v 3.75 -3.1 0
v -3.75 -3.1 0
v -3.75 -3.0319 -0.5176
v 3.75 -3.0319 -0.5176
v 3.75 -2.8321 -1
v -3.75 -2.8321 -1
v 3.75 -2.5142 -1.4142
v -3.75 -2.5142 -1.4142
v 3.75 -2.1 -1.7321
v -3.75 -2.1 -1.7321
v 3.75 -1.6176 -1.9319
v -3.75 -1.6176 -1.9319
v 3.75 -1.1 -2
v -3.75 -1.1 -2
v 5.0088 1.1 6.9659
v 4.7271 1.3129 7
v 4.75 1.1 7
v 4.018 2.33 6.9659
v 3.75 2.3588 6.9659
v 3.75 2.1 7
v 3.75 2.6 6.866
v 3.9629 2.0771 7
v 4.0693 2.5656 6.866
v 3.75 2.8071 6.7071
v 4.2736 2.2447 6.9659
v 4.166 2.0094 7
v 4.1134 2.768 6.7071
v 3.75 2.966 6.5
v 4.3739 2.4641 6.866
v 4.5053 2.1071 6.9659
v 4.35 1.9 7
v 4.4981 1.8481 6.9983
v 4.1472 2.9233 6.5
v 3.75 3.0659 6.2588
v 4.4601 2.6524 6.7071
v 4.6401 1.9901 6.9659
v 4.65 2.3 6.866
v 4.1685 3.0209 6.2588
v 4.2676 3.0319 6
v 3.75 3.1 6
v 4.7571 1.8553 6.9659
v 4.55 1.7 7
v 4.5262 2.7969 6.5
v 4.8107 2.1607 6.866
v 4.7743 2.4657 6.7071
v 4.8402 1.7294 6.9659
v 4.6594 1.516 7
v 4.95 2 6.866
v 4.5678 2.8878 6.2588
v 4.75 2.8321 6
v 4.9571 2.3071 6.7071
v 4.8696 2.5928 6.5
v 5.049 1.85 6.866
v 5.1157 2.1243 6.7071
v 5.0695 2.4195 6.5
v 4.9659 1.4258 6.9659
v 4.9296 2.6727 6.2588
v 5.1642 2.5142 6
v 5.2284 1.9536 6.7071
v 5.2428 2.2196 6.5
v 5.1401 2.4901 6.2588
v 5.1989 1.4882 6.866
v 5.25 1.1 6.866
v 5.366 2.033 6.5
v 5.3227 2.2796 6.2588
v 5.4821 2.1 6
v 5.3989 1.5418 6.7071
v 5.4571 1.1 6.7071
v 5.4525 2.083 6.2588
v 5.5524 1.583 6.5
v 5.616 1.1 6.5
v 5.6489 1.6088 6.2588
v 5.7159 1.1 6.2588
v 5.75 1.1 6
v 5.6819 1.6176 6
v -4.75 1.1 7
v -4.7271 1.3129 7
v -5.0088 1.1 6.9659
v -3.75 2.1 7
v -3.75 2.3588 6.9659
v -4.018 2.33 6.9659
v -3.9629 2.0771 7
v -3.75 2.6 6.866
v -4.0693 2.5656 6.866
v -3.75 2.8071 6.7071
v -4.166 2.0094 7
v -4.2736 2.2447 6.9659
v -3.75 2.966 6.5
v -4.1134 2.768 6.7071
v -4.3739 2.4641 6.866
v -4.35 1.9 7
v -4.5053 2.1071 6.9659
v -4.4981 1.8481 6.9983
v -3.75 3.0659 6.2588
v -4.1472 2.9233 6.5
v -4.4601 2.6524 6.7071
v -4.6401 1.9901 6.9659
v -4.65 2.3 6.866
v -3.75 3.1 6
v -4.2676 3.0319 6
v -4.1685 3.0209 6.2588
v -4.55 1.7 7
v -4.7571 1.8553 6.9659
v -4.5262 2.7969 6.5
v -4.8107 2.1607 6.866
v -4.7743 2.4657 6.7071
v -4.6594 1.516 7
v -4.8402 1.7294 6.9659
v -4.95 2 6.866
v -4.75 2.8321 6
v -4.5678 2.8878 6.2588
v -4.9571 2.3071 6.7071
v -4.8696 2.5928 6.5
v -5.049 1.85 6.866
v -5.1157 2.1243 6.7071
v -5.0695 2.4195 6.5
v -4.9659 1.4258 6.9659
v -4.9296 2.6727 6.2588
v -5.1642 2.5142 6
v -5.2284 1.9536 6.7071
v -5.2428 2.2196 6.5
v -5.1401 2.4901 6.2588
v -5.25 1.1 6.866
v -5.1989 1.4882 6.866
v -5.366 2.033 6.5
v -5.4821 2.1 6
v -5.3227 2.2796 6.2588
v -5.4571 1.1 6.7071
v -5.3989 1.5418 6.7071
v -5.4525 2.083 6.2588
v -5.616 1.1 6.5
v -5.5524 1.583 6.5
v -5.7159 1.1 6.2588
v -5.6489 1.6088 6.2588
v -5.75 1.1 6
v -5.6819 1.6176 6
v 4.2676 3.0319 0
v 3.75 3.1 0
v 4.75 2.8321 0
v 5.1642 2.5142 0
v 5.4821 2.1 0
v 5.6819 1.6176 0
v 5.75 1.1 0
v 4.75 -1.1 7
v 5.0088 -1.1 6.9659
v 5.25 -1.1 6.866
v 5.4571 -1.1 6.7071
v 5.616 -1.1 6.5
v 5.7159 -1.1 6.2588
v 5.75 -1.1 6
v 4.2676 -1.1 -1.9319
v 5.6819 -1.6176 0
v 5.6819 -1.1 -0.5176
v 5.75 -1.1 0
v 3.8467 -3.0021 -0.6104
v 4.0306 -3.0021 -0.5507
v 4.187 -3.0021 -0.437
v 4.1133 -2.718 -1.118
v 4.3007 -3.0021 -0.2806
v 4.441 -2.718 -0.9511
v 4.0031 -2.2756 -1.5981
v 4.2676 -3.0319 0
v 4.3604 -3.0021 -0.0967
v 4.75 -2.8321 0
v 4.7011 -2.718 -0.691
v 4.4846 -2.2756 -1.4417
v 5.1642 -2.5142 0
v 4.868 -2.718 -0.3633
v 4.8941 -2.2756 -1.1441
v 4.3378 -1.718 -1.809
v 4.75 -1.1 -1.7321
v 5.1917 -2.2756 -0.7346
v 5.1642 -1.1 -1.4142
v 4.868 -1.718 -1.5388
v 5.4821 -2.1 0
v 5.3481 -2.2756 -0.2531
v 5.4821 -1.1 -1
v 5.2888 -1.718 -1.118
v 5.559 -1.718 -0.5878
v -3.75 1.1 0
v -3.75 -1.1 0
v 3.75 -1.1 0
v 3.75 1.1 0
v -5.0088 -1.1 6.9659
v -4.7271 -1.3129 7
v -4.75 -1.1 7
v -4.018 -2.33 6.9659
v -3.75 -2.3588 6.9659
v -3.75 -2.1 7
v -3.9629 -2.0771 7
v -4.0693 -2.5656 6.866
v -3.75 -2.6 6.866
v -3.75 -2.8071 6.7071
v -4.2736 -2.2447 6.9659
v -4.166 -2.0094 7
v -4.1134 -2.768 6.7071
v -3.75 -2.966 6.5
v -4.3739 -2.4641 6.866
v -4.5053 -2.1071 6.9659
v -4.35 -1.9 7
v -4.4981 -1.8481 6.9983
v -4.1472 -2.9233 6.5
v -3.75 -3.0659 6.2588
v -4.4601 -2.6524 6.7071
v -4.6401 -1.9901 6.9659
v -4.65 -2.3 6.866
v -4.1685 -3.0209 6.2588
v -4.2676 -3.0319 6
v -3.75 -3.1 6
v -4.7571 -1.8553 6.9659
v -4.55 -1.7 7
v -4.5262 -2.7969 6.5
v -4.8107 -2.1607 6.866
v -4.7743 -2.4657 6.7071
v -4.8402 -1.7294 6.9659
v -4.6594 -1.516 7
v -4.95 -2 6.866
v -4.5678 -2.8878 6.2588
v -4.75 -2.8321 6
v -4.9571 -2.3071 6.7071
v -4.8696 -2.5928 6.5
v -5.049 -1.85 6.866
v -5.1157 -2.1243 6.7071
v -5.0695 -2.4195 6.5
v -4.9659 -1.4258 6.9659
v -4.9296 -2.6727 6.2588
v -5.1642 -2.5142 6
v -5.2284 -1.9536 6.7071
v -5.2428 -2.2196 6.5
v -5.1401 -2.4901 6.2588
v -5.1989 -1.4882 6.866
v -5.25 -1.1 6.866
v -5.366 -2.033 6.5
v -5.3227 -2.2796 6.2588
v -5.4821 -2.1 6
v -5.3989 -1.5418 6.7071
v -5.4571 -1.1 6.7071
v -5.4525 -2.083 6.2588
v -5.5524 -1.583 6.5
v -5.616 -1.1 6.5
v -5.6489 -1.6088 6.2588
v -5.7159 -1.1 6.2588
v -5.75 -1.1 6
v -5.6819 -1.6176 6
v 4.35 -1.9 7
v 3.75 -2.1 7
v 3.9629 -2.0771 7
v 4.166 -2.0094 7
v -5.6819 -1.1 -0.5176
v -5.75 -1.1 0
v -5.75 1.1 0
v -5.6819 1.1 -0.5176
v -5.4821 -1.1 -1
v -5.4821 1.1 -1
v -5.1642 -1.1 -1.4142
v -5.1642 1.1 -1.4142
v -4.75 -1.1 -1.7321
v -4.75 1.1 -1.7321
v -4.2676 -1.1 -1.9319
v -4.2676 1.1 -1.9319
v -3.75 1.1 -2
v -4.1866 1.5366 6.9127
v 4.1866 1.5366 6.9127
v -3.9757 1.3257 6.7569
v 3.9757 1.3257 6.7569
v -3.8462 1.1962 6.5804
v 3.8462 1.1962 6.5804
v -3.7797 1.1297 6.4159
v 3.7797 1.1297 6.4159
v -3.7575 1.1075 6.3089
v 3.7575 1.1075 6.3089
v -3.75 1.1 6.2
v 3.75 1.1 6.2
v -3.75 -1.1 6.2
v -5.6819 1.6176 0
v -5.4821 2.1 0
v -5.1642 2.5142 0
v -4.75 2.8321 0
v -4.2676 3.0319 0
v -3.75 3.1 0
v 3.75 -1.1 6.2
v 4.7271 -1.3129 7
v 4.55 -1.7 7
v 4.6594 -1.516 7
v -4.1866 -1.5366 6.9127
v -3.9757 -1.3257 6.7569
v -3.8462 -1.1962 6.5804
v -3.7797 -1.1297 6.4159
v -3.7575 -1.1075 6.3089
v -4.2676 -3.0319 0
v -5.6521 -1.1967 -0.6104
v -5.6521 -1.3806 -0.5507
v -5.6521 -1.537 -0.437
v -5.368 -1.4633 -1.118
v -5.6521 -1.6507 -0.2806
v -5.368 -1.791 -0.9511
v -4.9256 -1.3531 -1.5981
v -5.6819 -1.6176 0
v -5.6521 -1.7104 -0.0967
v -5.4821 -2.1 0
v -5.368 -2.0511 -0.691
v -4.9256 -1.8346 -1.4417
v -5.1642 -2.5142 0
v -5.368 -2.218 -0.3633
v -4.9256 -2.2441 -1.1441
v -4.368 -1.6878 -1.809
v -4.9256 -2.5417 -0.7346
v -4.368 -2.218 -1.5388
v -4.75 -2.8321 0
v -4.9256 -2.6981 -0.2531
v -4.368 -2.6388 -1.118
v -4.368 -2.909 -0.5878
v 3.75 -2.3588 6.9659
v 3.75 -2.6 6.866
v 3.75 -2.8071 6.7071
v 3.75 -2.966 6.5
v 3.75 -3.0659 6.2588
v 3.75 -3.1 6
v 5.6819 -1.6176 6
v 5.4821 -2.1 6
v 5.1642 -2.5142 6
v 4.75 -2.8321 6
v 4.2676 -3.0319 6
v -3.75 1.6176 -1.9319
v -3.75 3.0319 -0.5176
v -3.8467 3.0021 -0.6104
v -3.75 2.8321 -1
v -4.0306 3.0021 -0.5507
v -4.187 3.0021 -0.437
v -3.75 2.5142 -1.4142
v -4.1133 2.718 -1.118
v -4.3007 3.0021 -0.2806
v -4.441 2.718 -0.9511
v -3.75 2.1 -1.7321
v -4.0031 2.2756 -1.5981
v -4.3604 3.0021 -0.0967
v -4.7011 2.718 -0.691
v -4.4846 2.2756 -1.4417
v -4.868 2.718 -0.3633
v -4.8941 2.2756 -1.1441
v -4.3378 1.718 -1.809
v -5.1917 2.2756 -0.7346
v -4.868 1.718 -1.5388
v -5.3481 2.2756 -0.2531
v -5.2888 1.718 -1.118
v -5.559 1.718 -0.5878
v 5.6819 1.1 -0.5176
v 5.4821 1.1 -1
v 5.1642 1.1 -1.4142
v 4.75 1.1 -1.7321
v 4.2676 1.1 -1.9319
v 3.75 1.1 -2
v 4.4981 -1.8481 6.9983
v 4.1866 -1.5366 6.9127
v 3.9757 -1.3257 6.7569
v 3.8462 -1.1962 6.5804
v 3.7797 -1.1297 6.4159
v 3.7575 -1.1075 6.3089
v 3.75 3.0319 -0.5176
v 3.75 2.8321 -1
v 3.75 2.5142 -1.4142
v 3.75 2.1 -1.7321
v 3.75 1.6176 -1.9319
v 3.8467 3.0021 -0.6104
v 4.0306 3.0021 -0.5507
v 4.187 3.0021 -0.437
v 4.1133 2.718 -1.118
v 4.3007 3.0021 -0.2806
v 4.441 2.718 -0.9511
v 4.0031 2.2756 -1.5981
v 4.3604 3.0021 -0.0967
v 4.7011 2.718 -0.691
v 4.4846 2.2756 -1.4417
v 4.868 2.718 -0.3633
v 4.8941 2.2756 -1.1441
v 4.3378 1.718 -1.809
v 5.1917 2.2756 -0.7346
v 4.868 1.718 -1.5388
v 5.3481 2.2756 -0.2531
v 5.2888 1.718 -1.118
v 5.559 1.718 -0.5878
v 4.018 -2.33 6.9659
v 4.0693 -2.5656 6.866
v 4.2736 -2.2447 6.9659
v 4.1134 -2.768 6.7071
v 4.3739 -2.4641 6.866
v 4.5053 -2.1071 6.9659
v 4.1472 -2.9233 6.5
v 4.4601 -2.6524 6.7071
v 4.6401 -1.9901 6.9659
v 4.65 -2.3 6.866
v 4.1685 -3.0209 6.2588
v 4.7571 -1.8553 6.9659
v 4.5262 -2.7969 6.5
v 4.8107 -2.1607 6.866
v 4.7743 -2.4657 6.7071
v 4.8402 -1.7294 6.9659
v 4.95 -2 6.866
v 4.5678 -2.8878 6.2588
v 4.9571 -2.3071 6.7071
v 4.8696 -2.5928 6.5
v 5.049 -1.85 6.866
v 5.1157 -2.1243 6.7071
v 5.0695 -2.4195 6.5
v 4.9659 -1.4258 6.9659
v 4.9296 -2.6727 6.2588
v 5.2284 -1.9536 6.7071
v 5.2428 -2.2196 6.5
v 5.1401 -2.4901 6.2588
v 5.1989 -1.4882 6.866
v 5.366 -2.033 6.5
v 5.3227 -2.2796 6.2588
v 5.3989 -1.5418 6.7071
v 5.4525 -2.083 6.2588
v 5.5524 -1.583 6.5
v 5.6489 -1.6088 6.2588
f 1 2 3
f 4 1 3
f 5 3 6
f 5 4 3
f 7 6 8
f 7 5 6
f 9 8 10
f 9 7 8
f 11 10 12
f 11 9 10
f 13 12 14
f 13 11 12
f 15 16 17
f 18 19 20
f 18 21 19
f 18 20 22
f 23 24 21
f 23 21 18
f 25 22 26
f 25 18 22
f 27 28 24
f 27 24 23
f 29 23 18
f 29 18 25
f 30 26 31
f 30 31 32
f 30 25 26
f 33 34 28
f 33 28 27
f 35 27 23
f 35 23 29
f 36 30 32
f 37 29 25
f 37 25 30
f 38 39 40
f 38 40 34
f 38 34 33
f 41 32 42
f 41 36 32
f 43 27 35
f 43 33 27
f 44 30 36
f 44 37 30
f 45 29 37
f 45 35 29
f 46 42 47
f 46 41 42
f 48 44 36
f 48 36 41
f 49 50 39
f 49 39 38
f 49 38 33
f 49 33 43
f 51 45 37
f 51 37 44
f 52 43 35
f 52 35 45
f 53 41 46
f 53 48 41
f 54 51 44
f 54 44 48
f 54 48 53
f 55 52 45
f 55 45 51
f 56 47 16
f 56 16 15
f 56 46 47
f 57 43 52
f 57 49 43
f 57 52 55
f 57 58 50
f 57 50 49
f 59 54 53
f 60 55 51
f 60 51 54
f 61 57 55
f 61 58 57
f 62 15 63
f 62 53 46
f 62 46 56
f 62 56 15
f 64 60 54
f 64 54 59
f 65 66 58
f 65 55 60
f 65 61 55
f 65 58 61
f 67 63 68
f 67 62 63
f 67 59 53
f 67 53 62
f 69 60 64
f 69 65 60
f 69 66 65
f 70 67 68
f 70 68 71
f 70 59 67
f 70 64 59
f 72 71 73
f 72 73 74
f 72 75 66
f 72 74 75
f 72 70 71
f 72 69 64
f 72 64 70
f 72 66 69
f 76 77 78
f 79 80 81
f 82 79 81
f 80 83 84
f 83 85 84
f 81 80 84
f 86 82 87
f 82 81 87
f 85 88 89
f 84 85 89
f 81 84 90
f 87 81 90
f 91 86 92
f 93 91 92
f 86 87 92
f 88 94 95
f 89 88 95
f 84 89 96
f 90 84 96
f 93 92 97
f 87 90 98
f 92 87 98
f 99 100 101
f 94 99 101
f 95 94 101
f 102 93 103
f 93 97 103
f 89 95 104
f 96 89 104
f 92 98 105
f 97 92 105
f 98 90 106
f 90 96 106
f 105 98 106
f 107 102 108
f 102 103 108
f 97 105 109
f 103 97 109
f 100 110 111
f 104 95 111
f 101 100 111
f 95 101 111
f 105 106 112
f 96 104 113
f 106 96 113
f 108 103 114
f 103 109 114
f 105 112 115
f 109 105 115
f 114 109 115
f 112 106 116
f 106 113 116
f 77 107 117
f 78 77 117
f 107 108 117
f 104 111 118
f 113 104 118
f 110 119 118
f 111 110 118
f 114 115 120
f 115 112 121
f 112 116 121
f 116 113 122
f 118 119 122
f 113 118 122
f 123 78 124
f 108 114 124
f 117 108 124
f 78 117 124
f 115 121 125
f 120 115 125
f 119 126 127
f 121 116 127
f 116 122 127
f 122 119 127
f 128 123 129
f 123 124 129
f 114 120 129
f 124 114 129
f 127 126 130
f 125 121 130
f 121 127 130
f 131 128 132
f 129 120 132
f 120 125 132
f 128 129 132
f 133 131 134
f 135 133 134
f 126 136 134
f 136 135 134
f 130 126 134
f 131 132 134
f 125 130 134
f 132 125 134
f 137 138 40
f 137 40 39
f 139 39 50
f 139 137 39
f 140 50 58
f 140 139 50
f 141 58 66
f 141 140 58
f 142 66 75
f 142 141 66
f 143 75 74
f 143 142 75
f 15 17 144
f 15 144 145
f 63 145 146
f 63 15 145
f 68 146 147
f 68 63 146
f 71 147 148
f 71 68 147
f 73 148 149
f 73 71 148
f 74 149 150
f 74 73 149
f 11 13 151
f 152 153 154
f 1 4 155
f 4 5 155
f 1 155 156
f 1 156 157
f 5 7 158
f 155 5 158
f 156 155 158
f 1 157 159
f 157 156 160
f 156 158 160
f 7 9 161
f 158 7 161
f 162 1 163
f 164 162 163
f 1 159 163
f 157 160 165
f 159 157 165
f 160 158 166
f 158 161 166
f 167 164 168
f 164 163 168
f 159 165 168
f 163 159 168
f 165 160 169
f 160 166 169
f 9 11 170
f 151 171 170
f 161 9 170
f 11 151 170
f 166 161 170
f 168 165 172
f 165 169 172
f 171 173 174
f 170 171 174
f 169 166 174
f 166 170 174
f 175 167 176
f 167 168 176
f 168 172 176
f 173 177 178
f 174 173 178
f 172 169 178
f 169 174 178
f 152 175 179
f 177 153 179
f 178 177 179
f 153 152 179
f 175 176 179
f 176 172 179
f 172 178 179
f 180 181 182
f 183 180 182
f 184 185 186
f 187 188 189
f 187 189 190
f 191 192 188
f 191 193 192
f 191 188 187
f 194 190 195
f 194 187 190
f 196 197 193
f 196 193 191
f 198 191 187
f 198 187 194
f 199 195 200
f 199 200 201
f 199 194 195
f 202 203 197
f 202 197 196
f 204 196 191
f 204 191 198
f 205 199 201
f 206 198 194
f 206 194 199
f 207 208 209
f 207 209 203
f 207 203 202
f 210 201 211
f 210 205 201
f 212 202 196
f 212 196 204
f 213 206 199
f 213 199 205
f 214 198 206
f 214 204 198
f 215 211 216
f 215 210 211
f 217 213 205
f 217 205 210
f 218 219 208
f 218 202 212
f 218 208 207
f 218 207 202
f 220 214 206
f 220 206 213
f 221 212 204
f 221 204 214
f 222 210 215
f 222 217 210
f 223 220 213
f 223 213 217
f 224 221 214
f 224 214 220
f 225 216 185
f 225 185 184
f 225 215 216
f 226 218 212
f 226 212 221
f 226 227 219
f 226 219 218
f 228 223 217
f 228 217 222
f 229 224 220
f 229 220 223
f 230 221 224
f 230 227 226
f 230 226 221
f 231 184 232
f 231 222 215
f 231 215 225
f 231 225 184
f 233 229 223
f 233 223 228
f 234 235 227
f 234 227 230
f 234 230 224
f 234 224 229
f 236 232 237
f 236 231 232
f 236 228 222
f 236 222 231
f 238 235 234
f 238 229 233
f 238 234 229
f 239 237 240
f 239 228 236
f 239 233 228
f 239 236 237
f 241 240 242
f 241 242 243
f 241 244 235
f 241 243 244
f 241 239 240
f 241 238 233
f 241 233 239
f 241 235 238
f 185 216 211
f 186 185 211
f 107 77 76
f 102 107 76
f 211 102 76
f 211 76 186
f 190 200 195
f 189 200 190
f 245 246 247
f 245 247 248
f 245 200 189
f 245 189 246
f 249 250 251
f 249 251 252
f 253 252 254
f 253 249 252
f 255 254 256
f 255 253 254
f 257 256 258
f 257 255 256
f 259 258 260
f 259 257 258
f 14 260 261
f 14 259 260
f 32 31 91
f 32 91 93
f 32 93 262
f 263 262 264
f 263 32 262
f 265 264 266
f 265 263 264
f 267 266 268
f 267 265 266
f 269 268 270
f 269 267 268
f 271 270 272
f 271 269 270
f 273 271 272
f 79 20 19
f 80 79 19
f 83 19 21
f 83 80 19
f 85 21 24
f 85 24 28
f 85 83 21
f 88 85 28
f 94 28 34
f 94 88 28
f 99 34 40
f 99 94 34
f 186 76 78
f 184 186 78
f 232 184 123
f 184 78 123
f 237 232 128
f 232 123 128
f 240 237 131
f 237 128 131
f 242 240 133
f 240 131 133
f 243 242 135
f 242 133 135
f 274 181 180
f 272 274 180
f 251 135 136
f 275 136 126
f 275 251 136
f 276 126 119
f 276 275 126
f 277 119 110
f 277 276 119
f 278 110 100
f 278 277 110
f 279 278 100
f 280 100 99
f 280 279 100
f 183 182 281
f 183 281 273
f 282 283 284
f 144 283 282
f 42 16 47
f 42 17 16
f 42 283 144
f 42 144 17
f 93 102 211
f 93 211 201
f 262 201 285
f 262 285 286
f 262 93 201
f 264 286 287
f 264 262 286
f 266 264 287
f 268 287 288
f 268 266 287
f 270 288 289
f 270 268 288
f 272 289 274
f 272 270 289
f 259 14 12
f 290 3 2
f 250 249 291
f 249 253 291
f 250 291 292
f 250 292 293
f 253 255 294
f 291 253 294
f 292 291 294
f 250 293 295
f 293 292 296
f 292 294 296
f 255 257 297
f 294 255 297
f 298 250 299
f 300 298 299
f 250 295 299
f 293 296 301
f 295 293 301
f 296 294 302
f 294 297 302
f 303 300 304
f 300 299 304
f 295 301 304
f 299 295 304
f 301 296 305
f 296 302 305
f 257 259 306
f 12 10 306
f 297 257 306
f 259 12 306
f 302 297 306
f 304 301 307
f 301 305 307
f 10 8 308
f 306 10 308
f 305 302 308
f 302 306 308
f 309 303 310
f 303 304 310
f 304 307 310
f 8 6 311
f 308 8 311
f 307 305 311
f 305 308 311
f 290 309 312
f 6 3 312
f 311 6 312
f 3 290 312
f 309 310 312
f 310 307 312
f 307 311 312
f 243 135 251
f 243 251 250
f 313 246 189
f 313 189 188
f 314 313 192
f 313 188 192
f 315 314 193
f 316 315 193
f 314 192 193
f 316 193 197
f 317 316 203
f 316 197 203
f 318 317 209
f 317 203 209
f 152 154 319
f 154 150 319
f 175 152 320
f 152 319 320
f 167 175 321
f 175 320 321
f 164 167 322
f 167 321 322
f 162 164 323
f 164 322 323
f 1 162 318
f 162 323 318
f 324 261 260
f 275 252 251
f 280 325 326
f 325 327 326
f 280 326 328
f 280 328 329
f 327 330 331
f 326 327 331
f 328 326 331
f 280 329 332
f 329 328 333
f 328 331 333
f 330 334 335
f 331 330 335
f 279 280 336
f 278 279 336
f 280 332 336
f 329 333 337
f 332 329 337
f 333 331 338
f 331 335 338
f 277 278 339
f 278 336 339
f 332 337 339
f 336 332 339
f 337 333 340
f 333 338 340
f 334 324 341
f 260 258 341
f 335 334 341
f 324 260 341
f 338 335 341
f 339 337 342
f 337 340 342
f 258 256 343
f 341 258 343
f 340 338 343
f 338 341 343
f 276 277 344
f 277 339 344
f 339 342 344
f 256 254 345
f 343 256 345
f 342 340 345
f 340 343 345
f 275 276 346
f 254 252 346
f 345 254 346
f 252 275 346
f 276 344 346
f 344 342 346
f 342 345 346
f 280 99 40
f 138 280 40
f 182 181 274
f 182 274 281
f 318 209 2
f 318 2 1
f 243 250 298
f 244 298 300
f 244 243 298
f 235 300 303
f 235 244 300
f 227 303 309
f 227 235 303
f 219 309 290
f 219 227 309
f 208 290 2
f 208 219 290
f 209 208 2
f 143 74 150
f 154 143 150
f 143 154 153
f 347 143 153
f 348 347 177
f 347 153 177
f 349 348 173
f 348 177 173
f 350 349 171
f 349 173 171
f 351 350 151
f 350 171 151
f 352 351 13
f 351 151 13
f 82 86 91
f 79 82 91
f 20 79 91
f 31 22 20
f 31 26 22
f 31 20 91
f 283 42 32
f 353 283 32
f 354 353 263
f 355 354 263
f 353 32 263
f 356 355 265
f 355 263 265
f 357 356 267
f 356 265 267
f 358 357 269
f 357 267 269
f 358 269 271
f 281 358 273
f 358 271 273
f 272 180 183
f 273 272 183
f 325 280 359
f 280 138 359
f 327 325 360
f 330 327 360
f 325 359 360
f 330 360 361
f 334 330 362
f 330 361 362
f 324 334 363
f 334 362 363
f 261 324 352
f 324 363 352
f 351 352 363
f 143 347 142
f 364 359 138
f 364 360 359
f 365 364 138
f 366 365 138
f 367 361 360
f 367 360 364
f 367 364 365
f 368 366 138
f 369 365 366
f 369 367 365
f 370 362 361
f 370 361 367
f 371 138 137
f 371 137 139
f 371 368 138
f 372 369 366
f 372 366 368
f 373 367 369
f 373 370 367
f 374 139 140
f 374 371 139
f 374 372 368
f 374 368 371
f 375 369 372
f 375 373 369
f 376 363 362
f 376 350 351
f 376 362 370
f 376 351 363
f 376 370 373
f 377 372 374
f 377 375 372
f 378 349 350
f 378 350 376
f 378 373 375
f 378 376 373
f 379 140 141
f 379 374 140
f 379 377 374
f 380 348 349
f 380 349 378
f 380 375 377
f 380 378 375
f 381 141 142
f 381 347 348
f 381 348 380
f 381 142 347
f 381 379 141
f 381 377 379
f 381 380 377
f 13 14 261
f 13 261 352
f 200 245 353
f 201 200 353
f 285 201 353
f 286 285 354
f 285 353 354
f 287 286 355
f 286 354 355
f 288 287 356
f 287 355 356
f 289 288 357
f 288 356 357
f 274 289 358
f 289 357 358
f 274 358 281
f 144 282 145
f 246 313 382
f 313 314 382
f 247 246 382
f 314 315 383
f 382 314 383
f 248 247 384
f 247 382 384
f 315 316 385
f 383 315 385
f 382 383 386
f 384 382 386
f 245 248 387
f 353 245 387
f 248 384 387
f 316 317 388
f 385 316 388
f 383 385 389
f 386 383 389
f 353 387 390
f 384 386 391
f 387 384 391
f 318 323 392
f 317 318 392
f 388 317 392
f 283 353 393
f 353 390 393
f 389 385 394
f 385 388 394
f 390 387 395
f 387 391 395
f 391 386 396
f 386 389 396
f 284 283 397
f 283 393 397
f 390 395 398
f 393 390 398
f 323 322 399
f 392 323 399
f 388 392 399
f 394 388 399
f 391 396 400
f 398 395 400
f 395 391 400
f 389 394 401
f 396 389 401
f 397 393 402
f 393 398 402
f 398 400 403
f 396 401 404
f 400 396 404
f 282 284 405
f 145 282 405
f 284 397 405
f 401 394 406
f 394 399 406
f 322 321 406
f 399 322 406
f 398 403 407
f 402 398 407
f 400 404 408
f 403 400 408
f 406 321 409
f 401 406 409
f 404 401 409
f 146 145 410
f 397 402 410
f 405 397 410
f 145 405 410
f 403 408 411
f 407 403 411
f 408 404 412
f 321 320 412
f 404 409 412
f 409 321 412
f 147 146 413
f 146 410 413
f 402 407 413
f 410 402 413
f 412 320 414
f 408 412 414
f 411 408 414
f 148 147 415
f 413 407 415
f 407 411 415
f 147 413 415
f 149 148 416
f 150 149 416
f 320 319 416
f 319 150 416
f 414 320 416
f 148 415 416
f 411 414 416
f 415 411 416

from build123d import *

# Parameters (mm, degrees)
F0_W         = 11.5
F0_H         = 6.2
F0_W_2       = 7.5
F0_H_2       = 2.2
F1_DEPTH     = 7
F2_W         = 11.5
F2_H         = 6.2
F3_DEPTH     = 2
F4_R         = 2
F5_R         = 0.8
F6_T1_DEPTH  = 2.2
F6_T3_DEPTH  = 7.5
F6_T6_ANGLE  = 90
F6_T8_ANGLE  = 90
F6_T10_ANGLE = 90
F6_T12_ANGLE = 90


# Not quite as in the source:
# - a fillet or chamfer that OpenCascade refuses, or shapes differently, is made with other operations: its cross-section is extruded or revolved along the edge and cut away or added


with BuildPart() as f1:
    # F0 (on Top) → F1 (new body)
    with BuildSketch(Plane.XY):
        Rectangle(F0_W, F0_H)
        Rectangle(F0_W_2, F0_H_2, mode=Mode.SUBTRACT)
    extrude(amount=F1_DEPTH)

    # F2 (on face) → F3 (join)
    with BuildSketch(Plane(origin=(0, 0, 0), x_dir=(1, 0, 0), z_dir=(0, 0, -1))):
        Rectangle(F2_W, F2_H)
    extrude(amount=F3_DEPTH)

    # F4
    f4_edges = [f1.edges().sort_by_distance(p)[0] for p in [
        (5.75, 0, -2),
        (0, -3.1, -2),
        (-5.75, 0, -2),
        (0, 3.1, -2),
        (5.75, -3.1, 2.5),
        (5.75, 3.1, 2.5),
        (-5.75, -3.1, 2.5),
        (-5.75, 3.1, 2.5),
    ]]
    fillet(f4_edges, radius=F4_R)

    # F5
    f5_edges = [f1.edges().sort_by_distance(p)[0] for p in [
        (0, -1.1, 7),
        (3.75, 0, 7),
        (-3.75, 0, 7),
        (0, 1.1, 7),
    ]]
    fillet(f5_edges, radius=F5_R)

    # F6: fillet of radius 1 on 8 edges, made by hand

    # F6_s2 → F6_t1 (cut)
    with BuildSketch(Plane.XZ.offset(-1.1)):
        with BuildLine():
            ThreePointArc((4.75, 7), (5.4571067812, 6.7071067812), (5.75, 6))
            Line((5.75, 6), (5.75, 7))
            Line((5.75, 7), (4.75, 7))
        make_face()
        with BuildLine():
            ThreePointArc((-4.75, 7), (-5.4571067812, 6.7071067812), (-5.75, 6))
            Line((-5.75, 6), (-5.75, 7))
            Line((-5.75, 7), (-4.75, 7))
        make_face()
    extrude(amount=F6_T1_DEPTH, mode=Mode.SUBTRACT)

    # F6_s4 → F6_t3 (cut)
    with BuildSketch(Plane.YZ.offset(-3.75)):
        with BuildLine():
            ThreePointArc((2.1, 7), (2.8071067812, 6.7071067812), (3.1, 6))
            Line((3.1, 6), (3.1, 7))
            Line((3.1, 7), (2.1, 7))
        make_face()
        with BuildLine():
            ThreePointArc((-2.1, 7), (-2.8071067812, 6.7071067812), (-3.1, 6))
            Line((-3.1, 6), (-3.1, 7))
            Line((-3.1, 7), (-2.1, 7))
        make_face()
    extrude(amount=F6_T3_DEPTH, mode=Mode.SUBTRACT)

    # F6_s5 → F6_t6 (revolve, cut)
    with BuildSketch(Plane.YZ.offset(3.75)):
        with BuildLine():
            ThreePointArc((2.1, 7), (2.8071067812, 6.7071067812), (3.1, 6))
            Line((3.1, 6), (3.1, 7))
            Line((3.1, 7), (2.1, 7))
        make_face()
    revolve(axis=Axis((3.75, 1.1, 7), (0, 0, -1)), revolution_arc=F6_T6_ANGLE, mode=Mode.SUBTRACT)

    # F6_s7 → F6_t8 (revolve, cut)
    with BuildSketch(Plane.YZ.offset(-3.75)):
        with BuildLine():
            ThreePointArc((2.1, 7), (2.8071067812, 6.7071067812), (3.1, 6))
            Line((3.1, 6), (3.1, 7))
            Line((3.1, 7), (2.1, 7))
        make_face()
    revolve(axis=Axis((-3.75, 1.1, 7), (0, 0, 1)), revolution_arc=F6_T8_ANGLE, mode=Mode.SUBTRACT)

    # F6_s9 → F6_t10 (revolve, cut)
    with BuildSketch(Plane.YZ.offset(3.75)):
        with BuildLine():
            ThreePointArc((-2.1, 7), (-2.8071067812, 6.7071067812), (-3.1, 6))
            Line((-3.1, 6), (-3.1, 7))
            Line((-3.1, 7), (-2.1, 7))
        make_face()
    revolve(axis=Axis((3.75, -1.1, 7), (0, 0, 1)), revolution_arc=F6_T10_ANGLE, mode=Mode.SUBTRACT)

    # F6_s11 → F6_t12 (revolve, cut)
    with BuildSketch(Plane.YZ.offset(-3.75)):
        with BuildLine():
            ThreePointArc((-2.1, 7), (-2.8071067812, 6.7071067812), (-3.1, 6))
            Line((-3.1, 6), (-3.1, 7))
            Line((-3.1, 7), (-2.1, 7))
        make_face()
    revolve(axis=Axis((-3.75, -1.1, 7), (0, 0, -1)), revolution_arc=F6_T12_ANGLE, mode=Mode.SUBTRACT)


solid = f1.part
